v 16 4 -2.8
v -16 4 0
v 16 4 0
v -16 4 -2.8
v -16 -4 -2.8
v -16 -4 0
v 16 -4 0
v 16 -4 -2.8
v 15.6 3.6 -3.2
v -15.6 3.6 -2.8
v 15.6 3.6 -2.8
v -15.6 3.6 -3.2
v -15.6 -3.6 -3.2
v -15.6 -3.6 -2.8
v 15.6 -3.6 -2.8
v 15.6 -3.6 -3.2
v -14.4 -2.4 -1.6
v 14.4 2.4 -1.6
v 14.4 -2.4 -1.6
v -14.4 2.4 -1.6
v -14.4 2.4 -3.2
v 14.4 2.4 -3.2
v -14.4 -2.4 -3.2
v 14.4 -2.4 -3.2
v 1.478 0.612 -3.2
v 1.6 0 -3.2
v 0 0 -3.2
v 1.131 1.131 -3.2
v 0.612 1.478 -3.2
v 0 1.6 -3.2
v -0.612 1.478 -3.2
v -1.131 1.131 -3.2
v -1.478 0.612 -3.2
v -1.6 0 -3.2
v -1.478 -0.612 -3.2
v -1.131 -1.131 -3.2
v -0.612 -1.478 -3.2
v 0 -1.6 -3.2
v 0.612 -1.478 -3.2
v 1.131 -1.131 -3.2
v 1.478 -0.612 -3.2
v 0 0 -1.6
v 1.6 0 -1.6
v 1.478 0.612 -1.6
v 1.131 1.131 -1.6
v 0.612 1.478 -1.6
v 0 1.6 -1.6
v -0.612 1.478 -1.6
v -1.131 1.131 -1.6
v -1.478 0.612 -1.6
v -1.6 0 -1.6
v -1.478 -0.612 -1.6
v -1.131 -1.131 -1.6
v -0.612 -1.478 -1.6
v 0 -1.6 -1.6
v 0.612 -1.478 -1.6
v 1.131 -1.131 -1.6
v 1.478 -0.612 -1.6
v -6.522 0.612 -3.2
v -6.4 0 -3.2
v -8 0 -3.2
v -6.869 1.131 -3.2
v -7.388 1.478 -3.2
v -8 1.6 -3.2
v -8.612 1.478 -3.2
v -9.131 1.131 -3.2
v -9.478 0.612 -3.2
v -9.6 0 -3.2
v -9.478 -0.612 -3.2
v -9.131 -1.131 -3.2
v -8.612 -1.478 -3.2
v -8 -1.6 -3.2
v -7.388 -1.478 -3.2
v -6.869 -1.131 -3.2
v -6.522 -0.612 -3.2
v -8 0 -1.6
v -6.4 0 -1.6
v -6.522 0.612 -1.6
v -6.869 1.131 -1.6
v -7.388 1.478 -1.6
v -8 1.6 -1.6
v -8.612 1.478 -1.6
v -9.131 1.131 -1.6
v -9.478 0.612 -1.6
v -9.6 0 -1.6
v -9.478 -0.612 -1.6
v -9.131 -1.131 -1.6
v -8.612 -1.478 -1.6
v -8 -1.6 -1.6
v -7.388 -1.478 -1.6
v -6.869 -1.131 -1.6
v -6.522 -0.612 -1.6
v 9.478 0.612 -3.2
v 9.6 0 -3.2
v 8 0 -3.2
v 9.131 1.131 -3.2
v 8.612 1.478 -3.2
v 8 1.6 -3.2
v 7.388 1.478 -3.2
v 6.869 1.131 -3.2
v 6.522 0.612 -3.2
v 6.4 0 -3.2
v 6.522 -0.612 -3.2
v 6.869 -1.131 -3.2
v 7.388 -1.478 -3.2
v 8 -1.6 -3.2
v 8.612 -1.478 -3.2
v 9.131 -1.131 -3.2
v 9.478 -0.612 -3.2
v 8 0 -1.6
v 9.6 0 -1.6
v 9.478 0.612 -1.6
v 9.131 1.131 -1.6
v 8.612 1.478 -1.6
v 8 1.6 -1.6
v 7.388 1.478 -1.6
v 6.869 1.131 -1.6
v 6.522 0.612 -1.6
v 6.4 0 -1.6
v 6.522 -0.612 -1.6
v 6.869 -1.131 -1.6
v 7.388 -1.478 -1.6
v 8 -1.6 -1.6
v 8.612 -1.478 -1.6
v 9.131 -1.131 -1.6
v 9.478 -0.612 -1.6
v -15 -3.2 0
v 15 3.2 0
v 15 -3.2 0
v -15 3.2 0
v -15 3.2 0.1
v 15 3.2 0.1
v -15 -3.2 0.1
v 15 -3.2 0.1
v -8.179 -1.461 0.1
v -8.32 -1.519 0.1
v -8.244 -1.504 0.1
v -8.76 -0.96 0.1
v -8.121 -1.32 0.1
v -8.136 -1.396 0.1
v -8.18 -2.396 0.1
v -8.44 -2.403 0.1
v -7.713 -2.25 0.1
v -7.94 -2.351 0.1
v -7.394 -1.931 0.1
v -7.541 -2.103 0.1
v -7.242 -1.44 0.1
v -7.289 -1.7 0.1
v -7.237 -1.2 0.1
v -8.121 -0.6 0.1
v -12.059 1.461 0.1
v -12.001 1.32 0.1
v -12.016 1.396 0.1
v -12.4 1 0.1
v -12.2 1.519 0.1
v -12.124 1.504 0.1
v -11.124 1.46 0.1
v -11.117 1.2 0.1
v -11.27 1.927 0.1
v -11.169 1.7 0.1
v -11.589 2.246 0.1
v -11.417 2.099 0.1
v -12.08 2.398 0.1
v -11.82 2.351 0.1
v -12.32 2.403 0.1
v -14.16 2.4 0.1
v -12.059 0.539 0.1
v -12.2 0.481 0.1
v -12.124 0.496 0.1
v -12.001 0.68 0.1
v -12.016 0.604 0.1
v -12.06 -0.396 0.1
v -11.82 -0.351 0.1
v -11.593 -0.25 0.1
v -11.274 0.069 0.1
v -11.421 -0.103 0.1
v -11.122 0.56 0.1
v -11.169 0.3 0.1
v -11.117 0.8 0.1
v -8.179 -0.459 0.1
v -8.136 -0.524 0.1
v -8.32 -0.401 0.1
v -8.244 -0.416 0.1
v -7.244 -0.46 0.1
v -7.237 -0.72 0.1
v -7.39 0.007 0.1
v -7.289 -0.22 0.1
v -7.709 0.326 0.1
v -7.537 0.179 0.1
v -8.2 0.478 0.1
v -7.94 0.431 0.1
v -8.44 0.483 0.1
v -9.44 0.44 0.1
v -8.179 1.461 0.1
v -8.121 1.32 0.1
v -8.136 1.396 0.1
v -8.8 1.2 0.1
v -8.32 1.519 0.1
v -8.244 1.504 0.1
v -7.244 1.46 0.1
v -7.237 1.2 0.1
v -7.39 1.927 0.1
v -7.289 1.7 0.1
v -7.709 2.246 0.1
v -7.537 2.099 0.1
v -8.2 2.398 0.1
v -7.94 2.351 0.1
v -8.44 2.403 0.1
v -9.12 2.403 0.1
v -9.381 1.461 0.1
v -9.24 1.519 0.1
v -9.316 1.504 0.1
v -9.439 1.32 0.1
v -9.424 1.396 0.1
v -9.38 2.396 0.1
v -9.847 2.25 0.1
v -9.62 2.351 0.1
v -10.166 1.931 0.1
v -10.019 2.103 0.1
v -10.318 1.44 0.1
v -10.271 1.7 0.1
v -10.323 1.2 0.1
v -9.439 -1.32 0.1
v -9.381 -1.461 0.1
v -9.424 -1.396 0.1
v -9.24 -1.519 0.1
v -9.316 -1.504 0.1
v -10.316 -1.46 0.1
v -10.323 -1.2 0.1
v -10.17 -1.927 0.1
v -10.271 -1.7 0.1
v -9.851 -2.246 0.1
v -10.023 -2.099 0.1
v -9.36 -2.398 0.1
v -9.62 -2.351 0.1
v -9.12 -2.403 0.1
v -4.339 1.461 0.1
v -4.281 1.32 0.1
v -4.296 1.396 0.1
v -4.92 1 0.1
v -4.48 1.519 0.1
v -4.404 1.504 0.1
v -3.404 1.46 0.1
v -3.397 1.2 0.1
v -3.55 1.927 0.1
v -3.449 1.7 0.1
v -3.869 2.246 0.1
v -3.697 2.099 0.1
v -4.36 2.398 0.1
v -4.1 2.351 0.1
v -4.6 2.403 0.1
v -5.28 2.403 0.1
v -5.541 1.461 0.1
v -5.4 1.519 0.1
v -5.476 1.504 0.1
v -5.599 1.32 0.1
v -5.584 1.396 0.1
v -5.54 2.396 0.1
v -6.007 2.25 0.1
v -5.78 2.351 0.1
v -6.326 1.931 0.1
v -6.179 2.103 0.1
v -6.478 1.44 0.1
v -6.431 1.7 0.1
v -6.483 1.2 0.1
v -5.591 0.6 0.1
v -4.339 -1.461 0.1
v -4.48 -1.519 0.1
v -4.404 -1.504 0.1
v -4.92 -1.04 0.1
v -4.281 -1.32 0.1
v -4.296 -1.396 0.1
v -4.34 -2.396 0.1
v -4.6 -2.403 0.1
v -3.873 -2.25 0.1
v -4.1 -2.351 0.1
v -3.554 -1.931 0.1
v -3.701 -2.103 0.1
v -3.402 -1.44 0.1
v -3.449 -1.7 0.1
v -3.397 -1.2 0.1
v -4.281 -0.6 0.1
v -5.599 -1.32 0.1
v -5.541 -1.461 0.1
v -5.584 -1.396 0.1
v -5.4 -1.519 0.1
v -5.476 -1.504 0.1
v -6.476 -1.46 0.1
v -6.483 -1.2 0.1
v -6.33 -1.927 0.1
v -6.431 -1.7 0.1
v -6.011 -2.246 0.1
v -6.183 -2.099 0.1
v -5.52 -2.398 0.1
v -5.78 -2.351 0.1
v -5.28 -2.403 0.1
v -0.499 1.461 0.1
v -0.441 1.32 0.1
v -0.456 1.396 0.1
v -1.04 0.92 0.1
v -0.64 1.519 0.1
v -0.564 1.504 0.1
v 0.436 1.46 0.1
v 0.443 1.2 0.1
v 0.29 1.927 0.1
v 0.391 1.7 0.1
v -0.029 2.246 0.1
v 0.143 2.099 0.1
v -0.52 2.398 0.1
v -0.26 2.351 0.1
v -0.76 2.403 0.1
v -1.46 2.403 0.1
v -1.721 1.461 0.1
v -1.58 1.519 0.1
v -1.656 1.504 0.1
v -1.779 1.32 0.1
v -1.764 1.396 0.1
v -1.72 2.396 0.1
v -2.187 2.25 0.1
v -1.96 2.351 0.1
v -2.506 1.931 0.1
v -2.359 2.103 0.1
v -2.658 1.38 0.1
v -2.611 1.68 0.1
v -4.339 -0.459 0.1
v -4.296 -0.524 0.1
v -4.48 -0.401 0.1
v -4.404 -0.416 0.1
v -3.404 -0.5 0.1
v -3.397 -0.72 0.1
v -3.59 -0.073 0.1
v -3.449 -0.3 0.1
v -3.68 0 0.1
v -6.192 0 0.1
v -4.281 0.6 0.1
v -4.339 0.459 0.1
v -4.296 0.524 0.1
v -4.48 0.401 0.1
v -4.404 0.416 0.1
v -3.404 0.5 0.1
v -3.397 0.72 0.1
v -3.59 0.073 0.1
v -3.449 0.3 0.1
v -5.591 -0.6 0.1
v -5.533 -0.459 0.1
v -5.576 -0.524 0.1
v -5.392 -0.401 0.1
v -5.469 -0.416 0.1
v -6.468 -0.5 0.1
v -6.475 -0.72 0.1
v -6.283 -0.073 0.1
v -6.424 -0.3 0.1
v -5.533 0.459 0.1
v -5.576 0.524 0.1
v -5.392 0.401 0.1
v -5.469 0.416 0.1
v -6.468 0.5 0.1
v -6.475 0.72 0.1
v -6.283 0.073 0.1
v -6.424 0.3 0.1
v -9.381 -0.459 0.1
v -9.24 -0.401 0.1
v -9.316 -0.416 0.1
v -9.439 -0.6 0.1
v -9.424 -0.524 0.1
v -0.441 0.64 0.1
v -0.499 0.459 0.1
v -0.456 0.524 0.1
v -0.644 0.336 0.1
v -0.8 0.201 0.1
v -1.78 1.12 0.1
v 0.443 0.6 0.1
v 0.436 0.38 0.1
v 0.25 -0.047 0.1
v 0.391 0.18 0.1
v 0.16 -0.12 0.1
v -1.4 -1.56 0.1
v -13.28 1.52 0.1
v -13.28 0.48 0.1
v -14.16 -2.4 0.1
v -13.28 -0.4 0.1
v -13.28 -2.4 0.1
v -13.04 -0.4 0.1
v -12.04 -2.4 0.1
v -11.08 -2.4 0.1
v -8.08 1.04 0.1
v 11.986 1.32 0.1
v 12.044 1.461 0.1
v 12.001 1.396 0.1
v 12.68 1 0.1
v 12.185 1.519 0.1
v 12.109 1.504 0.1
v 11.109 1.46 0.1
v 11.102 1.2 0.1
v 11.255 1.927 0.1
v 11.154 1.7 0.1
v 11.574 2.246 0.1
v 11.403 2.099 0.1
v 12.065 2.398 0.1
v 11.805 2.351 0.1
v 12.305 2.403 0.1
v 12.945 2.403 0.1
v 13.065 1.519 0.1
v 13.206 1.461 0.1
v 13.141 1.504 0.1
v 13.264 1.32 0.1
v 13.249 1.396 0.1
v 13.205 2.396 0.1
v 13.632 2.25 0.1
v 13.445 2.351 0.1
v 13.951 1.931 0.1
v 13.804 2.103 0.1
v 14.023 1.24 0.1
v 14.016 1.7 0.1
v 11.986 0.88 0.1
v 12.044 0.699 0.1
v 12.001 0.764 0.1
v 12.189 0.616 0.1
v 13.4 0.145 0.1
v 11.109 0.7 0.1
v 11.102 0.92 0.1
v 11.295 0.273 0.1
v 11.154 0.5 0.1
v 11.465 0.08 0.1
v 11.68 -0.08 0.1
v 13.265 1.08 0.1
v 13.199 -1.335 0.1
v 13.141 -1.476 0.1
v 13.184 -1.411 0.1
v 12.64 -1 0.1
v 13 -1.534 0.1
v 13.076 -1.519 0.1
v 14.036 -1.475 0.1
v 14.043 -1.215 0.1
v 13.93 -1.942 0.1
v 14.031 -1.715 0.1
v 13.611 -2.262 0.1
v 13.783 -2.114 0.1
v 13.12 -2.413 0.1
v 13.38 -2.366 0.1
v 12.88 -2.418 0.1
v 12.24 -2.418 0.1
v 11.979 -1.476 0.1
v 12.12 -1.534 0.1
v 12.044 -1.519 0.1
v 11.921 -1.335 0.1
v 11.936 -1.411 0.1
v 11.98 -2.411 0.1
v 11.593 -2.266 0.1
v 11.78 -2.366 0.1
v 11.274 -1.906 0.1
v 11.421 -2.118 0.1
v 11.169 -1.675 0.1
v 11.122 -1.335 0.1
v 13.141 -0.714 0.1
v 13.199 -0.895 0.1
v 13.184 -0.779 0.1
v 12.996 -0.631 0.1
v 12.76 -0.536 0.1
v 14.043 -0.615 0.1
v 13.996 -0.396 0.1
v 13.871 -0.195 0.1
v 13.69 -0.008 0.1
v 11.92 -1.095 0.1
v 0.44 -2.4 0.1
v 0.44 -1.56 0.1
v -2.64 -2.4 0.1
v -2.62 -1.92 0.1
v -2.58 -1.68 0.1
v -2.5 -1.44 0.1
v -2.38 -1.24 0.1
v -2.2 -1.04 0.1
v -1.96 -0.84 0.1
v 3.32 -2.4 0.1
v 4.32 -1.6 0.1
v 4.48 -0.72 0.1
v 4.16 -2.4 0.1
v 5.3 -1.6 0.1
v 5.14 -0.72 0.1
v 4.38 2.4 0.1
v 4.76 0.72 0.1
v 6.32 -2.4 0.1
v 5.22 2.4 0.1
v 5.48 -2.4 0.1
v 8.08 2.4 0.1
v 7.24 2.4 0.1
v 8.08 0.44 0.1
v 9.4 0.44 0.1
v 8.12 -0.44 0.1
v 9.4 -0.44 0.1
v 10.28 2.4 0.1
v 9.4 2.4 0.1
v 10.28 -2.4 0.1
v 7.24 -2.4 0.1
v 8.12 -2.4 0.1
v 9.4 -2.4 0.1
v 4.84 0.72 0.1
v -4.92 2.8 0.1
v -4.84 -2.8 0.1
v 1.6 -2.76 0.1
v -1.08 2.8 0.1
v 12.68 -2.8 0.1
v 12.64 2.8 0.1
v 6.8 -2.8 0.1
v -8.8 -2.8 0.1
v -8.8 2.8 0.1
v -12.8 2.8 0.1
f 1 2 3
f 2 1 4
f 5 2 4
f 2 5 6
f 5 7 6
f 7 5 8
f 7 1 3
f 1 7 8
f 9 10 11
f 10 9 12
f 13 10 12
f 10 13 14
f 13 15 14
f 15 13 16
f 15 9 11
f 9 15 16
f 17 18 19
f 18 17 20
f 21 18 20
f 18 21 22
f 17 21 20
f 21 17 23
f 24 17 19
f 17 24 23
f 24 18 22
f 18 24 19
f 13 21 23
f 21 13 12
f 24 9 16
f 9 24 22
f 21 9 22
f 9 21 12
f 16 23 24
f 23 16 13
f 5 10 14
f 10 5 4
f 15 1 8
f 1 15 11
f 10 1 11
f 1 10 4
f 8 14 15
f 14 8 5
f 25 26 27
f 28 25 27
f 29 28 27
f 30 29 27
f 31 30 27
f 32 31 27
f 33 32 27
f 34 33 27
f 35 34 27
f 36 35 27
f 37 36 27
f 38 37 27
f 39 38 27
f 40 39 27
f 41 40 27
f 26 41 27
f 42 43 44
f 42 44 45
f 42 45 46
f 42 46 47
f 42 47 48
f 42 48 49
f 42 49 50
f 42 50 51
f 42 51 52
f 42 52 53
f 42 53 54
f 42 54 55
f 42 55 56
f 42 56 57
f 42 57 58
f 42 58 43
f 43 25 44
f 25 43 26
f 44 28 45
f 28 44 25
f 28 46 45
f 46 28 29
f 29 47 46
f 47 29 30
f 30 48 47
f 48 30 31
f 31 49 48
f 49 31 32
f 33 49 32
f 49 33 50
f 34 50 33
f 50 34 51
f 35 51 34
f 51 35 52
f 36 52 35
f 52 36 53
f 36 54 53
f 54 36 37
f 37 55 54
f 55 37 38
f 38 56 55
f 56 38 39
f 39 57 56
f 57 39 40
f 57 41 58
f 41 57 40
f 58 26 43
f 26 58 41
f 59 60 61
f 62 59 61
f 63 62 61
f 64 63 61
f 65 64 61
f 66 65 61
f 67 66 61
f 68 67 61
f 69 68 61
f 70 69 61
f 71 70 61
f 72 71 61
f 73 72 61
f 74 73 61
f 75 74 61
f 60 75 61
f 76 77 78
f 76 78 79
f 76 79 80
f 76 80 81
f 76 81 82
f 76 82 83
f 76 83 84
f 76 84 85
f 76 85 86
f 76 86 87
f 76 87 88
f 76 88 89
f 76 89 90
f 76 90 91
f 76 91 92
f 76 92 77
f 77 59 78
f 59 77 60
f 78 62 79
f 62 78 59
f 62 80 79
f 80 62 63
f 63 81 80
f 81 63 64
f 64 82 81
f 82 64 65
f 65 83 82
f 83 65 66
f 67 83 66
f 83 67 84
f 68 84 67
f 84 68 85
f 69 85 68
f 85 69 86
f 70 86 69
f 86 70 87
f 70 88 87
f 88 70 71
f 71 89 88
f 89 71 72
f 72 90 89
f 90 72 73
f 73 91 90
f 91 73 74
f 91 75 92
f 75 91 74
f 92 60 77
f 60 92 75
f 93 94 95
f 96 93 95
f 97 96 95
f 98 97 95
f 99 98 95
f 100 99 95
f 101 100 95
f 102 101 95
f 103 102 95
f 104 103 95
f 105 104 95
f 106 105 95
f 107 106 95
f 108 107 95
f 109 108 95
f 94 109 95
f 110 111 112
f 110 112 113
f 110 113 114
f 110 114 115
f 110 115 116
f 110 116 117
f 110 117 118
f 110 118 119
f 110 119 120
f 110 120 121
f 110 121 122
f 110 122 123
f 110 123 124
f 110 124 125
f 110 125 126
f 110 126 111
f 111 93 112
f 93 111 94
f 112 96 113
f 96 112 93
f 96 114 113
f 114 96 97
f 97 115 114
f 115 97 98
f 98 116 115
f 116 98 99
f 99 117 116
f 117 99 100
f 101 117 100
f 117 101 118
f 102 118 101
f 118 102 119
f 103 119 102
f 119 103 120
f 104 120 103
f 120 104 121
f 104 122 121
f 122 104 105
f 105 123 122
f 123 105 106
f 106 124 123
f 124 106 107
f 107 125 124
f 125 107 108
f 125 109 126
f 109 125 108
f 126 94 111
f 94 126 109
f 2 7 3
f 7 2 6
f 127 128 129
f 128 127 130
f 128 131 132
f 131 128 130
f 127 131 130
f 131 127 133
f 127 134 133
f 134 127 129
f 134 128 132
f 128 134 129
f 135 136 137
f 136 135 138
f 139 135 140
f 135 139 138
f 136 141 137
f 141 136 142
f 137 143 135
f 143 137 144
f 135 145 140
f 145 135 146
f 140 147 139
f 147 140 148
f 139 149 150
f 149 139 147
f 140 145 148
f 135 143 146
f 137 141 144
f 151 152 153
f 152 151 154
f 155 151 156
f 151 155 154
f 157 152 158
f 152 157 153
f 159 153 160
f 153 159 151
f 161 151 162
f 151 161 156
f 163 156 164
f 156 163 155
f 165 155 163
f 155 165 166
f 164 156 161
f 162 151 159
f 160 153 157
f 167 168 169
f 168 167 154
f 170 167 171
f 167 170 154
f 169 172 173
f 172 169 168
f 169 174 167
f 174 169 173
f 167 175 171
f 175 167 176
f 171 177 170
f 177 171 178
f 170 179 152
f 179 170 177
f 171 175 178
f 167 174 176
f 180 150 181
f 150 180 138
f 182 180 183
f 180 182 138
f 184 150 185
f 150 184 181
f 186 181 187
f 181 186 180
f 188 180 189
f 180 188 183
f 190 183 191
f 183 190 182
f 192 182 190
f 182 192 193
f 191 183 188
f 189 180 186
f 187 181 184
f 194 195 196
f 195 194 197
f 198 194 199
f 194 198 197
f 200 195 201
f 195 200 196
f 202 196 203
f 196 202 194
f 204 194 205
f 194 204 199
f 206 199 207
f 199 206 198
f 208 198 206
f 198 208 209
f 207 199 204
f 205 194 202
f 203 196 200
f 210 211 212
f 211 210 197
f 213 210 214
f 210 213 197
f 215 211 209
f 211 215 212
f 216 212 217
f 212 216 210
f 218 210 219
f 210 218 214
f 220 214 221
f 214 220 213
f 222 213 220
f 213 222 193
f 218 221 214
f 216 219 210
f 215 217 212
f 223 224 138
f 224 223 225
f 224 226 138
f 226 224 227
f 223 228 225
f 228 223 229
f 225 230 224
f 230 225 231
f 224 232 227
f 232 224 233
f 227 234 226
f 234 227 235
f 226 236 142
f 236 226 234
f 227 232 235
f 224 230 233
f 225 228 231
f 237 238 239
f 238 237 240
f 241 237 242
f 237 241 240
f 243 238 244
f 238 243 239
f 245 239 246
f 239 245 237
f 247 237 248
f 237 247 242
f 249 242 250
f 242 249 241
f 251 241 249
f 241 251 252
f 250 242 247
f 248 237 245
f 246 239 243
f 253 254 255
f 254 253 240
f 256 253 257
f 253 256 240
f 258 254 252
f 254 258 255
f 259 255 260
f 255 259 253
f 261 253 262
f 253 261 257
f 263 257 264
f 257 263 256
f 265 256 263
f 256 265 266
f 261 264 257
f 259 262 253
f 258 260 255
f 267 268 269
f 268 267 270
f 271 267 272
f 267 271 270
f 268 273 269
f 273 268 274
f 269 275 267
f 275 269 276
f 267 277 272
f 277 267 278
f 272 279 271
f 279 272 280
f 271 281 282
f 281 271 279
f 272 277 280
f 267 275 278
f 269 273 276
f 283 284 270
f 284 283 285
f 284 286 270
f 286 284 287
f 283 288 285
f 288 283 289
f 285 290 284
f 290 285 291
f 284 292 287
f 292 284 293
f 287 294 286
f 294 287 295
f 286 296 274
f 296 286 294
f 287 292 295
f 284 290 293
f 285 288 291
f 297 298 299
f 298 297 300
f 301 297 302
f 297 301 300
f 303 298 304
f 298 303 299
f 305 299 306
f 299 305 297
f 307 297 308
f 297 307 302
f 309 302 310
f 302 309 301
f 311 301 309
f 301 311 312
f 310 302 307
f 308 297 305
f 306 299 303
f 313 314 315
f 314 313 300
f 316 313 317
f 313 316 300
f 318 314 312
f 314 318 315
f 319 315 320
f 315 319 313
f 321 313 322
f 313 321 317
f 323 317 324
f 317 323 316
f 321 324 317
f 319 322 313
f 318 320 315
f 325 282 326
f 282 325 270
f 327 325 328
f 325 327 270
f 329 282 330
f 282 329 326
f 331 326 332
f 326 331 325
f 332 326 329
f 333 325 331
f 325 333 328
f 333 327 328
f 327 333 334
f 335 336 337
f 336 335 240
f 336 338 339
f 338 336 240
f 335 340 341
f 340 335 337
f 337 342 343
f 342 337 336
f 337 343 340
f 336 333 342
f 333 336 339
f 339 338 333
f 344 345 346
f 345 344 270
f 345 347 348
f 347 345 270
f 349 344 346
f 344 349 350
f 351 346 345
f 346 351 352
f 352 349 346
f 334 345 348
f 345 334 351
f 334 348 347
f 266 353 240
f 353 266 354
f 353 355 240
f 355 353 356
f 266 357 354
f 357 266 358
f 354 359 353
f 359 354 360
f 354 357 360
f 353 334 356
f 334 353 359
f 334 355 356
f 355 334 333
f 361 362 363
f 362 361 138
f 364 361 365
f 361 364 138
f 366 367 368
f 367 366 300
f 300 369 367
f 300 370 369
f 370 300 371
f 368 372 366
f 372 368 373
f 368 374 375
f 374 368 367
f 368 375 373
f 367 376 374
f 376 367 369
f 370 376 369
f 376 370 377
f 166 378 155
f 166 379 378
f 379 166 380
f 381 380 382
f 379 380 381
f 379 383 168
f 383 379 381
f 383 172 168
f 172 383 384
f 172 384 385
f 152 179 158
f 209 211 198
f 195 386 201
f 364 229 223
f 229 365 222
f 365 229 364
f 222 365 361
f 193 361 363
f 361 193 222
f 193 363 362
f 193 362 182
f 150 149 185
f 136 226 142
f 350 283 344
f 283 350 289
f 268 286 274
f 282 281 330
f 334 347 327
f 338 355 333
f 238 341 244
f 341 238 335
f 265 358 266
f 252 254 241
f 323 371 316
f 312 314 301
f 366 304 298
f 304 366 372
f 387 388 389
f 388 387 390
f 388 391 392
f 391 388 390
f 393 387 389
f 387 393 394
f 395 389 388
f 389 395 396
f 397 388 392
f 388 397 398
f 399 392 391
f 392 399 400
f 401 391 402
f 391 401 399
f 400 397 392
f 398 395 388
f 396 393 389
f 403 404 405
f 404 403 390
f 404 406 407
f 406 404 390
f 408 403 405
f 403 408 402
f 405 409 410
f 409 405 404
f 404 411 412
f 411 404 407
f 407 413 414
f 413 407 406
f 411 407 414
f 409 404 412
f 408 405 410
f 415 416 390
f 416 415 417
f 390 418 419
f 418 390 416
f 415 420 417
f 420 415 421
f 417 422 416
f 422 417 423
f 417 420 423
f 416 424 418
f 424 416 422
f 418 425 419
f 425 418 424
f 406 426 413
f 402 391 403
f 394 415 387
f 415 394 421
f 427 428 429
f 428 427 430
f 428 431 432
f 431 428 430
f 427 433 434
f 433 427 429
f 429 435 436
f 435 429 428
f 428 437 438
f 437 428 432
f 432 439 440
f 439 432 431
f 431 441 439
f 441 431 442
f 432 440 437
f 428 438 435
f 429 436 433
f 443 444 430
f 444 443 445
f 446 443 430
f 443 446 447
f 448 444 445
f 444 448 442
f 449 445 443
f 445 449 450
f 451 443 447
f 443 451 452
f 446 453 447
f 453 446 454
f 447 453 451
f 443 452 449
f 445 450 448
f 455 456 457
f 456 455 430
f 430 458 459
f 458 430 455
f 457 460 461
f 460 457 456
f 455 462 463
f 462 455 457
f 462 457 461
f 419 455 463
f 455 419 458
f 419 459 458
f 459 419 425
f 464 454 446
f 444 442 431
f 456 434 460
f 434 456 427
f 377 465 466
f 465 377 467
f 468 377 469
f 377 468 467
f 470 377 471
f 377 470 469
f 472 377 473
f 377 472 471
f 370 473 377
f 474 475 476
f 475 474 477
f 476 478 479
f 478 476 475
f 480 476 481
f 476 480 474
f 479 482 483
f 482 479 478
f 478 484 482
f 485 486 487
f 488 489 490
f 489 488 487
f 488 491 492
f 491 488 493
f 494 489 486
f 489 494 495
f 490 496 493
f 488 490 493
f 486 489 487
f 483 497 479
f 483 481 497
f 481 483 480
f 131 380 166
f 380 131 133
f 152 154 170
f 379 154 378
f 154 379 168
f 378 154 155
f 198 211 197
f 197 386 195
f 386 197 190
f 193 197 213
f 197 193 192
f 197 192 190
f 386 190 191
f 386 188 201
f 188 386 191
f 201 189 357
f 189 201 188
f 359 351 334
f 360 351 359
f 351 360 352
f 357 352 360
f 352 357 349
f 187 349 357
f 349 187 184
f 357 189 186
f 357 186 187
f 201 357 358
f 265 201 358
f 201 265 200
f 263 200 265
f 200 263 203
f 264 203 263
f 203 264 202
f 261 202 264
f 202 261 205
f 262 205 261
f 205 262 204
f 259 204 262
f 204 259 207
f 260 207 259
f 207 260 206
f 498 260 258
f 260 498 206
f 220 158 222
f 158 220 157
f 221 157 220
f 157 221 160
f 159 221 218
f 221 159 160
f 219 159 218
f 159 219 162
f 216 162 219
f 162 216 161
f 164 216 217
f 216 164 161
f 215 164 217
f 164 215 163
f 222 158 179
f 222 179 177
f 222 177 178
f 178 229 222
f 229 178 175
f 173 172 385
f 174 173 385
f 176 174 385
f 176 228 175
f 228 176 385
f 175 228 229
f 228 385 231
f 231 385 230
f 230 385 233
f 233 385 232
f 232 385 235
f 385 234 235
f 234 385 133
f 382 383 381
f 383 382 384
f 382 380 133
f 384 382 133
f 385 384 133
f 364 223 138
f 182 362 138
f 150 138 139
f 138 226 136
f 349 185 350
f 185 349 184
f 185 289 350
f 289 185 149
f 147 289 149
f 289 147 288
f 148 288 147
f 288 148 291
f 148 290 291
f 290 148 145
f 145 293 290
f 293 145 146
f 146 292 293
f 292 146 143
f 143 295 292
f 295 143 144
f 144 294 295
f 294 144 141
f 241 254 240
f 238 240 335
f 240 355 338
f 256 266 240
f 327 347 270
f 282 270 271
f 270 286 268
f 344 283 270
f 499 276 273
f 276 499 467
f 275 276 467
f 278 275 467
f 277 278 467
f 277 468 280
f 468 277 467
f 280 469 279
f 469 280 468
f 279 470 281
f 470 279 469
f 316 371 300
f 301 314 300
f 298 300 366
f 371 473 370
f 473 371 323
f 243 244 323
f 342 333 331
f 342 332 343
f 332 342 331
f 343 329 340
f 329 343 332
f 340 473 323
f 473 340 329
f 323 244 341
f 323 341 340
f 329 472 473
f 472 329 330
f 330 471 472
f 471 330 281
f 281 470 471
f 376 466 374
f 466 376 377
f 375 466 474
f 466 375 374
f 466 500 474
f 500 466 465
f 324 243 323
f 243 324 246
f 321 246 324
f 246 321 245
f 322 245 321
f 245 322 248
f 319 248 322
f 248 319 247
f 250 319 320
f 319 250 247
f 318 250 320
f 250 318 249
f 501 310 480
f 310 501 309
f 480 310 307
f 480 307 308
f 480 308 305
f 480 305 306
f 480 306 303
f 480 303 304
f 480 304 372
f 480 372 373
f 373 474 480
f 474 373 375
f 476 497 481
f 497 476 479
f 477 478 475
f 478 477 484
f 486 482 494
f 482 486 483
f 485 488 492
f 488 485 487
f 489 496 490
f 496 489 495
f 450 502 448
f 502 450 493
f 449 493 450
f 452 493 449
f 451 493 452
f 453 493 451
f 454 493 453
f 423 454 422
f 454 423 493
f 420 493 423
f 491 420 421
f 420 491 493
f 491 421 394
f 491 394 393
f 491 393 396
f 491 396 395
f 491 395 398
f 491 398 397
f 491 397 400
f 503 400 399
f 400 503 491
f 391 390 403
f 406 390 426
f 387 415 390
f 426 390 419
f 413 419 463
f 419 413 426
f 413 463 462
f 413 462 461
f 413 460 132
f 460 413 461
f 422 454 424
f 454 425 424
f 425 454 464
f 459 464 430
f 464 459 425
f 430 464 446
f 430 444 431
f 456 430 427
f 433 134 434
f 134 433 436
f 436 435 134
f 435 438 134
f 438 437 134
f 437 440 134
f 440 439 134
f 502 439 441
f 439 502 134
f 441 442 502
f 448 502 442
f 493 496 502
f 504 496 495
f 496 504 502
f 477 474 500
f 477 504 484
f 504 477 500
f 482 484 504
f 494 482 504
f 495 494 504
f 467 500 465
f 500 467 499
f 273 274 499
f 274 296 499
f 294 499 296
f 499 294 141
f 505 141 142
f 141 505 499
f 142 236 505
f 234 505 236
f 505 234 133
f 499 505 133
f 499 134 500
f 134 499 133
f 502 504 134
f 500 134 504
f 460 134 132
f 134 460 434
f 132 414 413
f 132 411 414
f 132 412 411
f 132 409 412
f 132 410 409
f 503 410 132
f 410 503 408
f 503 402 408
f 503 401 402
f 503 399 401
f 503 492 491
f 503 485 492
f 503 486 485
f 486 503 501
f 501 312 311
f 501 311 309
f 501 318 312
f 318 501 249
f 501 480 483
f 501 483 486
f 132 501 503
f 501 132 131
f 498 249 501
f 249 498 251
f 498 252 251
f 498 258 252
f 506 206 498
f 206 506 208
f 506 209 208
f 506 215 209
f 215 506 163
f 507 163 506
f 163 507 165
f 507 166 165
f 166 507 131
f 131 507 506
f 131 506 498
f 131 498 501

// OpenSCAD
use <../lib.scad>
use <2431.scad>
use <6062886d.scad>
function ldraw_lib__2431d07() = [
// 0 Tile  1 x  4 with "R682 AHS" on White Background Sticker
// 0 Name: 2431d07.dat
// 0 Author: Evert-Jan Boer [ejboer]
// 0 !LDRAW_ORG Shortcut UPDATE 2024-10
// 0 !LICENSE Licensed under CC BY 4.0 : see CAreadme.txt
// 
// 0 BFC CERTIFY CCW
  [0,"BFC","CERTIFY"],
  [0,"BFC","CCW"],
// 
// 0 !CATEGORY Sticker Shortcut
// 0 !KEYWORDS Bricklink 2431pb567, Mini Cooper, set 10242
// 
// 0 !HISTORY 2024-09-30 [OrionP] Official Update 2024-08
// 0 !HISTORY 2024-11-09 [MagFors] Update description
// 0 !HISTORY 2024-12-01 [OrionP] Official Update 2024-10
// 
// 1 16 0 0 0 1 0 0 0 1 0 0 0 1 2431.dat
  [1,16,0,0,0,1,0,0,0,1,0,0,0,1, ldraw_lib__2431()],
// 1 16 0 0 0 1 0 0 0 1 0 0 0 1 6062886d.dat
  [1,16,0,0,0,1,0,0,0,1,0,0,0,1, ldraw_lib__6062886d()],
];
module ldraw_lib__2431d07(step=0, col=false, unit=2/5, alt=false, line=0.2, solid=!$preview)
    makepoly(ldraw_lib__2431d07(), step=step, col=col, unit=unit, alt=alt, line=line, solid=solid);
ldraw_lib__2431d07(line=0.2);
